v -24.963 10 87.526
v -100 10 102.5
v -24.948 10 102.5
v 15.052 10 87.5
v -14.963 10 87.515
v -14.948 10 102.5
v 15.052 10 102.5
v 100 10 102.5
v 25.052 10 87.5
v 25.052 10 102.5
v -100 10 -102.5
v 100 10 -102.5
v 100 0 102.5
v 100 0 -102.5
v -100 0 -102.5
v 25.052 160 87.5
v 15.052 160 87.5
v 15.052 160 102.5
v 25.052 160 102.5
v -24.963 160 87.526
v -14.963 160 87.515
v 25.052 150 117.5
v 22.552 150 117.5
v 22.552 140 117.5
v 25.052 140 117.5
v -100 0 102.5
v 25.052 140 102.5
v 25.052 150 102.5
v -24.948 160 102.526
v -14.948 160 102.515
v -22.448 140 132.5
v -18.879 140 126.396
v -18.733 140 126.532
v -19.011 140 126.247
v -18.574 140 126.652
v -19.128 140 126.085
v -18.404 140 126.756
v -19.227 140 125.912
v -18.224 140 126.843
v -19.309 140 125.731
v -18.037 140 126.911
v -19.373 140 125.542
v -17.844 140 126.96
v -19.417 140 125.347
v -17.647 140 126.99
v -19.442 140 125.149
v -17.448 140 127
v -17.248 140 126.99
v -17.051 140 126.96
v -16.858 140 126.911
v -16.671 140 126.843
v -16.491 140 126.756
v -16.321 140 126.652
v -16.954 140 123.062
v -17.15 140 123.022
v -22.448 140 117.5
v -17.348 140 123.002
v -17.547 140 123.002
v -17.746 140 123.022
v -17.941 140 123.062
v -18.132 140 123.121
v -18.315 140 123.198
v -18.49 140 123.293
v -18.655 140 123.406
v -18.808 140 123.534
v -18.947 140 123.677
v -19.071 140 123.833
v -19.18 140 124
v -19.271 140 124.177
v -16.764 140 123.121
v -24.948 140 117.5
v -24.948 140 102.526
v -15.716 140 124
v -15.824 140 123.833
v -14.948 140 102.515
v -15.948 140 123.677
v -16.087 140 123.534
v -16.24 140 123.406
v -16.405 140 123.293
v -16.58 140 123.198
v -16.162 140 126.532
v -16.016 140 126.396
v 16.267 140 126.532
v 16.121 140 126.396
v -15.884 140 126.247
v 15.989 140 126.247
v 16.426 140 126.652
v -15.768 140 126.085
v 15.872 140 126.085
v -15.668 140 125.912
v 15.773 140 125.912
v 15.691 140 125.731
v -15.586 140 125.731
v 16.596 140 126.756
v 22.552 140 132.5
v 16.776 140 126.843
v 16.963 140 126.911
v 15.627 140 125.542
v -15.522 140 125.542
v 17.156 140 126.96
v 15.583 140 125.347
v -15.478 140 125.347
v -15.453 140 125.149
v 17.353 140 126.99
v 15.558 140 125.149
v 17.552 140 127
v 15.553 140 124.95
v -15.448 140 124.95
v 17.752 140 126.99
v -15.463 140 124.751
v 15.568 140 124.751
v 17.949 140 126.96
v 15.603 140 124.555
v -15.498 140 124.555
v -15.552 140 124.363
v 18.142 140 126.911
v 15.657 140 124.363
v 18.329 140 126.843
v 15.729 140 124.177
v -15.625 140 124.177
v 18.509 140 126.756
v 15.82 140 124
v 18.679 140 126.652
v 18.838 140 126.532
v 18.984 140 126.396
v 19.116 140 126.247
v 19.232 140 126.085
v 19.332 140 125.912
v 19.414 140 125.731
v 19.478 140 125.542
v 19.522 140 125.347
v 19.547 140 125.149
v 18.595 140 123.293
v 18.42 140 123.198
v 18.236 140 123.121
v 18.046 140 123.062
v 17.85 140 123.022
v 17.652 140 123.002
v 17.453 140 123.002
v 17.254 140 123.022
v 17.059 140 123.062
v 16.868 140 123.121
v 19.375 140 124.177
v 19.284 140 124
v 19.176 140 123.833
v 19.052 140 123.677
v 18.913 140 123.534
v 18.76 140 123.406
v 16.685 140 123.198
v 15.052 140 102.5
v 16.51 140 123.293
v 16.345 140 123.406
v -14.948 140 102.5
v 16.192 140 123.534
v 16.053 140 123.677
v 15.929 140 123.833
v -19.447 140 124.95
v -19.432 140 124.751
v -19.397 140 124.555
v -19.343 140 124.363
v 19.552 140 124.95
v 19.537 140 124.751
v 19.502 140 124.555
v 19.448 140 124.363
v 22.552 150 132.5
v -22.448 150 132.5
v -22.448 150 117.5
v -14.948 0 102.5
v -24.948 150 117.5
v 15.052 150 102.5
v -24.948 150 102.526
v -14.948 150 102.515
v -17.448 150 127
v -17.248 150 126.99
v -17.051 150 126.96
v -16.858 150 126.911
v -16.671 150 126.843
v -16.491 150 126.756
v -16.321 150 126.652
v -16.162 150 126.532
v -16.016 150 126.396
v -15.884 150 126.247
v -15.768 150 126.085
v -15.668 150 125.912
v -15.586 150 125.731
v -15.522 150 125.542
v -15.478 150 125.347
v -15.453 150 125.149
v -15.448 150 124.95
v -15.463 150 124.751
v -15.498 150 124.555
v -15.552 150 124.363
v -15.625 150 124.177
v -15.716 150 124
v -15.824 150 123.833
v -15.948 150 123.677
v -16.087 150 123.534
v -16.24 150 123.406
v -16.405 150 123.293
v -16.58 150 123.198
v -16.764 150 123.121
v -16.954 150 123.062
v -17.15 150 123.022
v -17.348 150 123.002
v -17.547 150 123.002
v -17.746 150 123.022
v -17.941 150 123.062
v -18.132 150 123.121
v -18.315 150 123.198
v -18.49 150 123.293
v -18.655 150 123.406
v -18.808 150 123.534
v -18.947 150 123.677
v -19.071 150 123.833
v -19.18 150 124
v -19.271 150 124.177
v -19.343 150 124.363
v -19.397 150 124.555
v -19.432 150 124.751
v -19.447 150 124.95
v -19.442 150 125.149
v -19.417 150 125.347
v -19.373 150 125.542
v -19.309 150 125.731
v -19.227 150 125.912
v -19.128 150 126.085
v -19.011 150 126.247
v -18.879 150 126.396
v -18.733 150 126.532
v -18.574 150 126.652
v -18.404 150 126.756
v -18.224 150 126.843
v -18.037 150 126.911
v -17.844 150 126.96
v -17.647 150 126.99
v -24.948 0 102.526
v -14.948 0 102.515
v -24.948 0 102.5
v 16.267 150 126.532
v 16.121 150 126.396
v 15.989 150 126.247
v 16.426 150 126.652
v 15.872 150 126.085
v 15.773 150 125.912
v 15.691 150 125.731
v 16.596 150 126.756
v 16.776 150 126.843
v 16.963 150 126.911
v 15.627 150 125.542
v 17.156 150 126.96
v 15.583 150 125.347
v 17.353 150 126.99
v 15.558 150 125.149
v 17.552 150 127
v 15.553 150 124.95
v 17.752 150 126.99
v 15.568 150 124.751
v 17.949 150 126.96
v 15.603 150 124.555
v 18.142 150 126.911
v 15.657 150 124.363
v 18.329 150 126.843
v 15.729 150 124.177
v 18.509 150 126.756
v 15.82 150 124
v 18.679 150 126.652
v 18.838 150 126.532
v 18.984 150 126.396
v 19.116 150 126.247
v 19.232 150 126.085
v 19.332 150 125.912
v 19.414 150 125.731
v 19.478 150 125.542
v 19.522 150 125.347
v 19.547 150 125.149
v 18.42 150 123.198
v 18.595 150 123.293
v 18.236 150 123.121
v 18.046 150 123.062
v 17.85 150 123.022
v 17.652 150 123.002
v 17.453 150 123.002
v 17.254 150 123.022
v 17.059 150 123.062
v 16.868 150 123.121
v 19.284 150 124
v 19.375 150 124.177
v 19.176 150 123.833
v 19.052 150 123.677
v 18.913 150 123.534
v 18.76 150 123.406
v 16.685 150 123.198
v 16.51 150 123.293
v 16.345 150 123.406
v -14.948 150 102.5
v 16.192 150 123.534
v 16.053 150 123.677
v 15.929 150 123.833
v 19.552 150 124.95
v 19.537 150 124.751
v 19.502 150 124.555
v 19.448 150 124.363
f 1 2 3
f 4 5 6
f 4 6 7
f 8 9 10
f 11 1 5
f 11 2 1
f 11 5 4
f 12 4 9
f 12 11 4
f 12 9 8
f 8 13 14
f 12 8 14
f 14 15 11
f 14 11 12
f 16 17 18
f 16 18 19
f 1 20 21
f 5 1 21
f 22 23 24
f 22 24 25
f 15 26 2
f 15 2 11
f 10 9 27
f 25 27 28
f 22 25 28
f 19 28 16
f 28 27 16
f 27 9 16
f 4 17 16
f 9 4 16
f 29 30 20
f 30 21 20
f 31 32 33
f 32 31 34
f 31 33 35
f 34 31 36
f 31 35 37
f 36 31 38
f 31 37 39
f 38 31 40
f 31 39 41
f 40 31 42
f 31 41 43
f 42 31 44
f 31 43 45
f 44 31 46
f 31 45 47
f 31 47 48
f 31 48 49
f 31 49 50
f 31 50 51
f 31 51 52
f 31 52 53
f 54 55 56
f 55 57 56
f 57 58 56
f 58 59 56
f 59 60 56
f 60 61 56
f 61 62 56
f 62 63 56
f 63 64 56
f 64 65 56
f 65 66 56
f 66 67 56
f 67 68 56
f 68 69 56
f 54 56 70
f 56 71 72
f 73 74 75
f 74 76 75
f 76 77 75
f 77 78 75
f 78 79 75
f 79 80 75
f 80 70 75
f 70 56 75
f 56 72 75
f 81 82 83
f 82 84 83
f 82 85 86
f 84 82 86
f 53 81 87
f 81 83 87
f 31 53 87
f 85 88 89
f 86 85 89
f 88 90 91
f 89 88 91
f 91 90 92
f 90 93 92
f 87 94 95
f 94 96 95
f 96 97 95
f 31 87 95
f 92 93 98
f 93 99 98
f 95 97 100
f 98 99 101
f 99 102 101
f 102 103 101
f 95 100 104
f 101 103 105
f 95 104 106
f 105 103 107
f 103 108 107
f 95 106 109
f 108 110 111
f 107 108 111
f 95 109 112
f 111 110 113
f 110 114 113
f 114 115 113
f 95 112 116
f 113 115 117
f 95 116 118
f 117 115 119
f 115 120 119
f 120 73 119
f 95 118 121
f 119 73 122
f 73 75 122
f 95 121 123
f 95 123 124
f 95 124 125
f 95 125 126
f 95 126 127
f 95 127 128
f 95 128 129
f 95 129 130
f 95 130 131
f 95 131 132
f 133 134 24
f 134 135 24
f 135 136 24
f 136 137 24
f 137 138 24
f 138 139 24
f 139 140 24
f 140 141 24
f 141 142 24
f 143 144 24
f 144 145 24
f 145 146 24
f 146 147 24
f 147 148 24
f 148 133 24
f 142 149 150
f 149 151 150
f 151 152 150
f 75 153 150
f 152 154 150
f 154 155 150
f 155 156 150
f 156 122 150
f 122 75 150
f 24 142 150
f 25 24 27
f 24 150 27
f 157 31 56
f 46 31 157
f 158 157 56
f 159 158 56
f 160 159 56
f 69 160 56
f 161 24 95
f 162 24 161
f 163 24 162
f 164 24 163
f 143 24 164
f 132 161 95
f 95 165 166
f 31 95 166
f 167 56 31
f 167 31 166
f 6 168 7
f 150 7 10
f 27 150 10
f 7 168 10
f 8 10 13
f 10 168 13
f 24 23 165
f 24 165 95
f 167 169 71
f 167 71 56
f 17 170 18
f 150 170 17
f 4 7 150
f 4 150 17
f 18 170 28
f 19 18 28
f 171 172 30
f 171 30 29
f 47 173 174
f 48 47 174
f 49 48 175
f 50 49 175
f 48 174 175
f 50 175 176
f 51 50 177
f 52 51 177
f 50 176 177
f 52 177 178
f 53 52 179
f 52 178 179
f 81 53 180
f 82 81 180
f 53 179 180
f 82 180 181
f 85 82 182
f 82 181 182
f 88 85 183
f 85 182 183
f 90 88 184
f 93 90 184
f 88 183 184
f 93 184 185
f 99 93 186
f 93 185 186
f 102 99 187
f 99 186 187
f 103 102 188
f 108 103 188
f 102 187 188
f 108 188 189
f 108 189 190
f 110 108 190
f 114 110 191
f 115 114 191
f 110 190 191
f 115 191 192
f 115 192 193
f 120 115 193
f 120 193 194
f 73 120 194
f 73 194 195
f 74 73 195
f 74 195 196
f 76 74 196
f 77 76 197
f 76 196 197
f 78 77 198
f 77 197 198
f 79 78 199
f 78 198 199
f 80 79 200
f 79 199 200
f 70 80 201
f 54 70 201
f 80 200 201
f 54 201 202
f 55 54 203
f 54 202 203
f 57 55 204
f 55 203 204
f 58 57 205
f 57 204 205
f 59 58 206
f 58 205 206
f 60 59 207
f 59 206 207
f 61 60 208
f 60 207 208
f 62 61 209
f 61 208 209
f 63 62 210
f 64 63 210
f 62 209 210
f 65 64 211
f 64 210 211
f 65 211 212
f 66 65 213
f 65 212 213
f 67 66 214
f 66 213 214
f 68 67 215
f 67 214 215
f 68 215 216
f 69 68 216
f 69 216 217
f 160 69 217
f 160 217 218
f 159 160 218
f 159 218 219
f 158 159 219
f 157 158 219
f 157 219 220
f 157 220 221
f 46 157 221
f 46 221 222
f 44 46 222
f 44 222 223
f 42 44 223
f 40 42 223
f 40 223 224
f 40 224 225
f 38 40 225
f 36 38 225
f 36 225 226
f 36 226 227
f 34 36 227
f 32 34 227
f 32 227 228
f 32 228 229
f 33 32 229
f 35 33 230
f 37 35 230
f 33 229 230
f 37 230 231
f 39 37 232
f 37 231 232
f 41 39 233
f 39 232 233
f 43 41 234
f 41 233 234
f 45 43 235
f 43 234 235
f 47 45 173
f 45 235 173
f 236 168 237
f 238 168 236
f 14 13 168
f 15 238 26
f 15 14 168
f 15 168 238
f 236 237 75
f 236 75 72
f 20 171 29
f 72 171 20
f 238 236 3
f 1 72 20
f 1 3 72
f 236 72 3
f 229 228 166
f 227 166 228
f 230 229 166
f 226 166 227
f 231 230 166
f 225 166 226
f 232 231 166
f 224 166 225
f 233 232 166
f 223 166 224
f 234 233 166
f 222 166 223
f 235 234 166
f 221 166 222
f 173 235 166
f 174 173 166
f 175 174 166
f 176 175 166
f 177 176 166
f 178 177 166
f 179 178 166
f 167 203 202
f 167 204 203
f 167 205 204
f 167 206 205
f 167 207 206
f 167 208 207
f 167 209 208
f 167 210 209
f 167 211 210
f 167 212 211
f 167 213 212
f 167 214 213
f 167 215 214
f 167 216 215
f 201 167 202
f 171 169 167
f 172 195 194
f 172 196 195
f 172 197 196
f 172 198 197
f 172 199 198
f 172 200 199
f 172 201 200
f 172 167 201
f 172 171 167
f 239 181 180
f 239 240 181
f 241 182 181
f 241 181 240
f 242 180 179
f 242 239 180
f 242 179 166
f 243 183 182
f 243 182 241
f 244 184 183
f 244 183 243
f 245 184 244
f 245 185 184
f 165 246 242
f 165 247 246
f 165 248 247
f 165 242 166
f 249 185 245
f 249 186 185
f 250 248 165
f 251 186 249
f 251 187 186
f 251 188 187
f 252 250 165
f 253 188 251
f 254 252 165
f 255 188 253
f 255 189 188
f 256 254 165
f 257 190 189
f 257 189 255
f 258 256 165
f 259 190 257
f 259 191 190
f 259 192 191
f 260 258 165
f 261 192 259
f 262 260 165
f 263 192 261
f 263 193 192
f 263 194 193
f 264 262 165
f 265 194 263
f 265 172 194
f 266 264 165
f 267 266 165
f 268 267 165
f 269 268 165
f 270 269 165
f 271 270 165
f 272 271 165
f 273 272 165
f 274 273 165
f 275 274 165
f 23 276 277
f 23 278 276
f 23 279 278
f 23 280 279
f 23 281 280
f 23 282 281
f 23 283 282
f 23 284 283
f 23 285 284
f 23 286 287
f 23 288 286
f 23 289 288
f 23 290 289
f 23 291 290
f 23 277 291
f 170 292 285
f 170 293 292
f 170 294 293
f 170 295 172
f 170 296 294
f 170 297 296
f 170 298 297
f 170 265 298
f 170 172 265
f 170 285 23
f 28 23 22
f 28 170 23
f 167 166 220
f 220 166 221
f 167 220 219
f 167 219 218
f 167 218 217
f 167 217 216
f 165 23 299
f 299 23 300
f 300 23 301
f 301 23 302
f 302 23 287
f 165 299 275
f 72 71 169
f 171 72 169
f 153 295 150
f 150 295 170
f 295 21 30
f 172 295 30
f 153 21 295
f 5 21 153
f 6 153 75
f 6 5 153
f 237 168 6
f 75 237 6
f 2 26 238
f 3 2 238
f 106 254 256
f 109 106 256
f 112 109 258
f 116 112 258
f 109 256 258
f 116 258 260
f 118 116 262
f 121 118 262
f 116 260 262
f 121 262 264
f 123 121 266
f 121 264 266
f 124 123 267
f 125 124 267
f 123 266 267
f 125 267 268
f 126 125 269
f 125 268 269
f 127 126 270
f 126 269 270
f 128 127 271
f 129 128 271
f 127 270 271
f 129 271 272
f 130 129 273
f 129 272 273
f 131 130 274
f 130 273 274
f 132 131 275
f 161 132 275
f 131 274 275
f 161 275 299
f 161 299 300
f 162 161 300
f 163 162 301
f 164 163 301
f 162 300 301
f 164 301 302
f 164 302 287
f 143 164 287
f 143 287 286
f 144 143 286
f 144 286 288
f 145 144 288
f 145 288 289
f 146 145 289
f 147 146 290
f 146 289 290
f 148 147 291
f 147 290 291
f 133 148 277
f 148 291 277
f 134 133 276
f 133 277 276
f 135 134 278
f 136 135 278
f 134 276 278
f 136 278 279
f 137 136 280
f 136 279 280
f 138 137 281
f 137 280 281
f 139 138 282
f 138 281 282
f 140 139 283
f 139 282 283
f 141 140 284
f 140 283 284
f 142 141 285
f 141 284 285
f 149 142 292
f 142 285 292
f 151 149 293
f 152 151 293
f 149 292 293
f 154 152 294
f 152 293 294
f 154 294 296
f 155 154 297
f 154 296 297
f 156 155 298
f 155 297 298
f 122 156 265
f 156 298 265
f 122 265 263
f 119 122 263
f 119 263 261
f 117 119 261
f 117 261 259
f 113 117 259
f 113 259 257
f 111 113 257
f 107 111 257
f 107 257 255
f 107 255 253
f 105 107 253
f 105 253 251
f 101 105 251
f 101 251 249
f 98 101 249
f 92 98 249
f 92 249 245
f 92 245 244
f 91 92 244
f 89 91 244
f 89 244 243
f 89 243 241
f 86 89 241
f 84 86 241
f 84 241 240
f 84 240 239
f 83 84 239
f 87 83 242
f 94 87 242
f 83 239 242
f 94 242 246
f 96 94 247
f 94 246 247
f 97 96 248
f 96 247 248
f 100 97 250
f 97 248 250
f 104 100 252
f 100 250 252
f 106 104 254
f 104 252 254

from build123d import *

# Parameters (mm, degrees)
SKETCH2_W           = 200
SKETCH2_H           = 205
BOSS_EXTRUDE1_DEPTH = 10
SKETCH3_W           = 10
SKETCH3_H           = 15
BOSS_EXTRUDE3_DEPTH = 160
SKETCH8_W           = 49.999986941
SKETCH8_H           = 10
BOSS_EXTRUDE4_DEPTH = 15
BOSS_EXTRUDE5_DEPTH = 15
SKETCH10_R          = 2
CUT_EXTRUDE1_DEPTH  = 10


with BuildPart() as part:
    # Sketch2 → Boss-Extrude1 (new body)
    with BuildSketch(Plane(origin=(0, 0, 0), x_dir=(1, 0, 0), z_dir=(0, 1, 0))):
        Rectangle(SKETCH2_W, SKETCH2_H)
    extrude(amount=BOSS_EXTRUDE1_DEPTH)

    # Sketch3 → Boss-Extrude3 (add)
    with BuildSketch(Plane(origin=(0, 0, 0), x_dir=(1, 0, 0), z_dir=(0, 1, 0))):
        Polygon((-14.947609587, -102.515331482), (-24.947604363, -102.525552471), (-24.962935845, -87.525560306), (-14.962941069, -87.515339317), align=None)
        with Locations((20.052382578, -95)):
            Rectangle(SKETCH3_W, SKETCH3_H)
    extrude(amount=BOSS_EXTRUDE3_DEPTH)

    # Sketch8 → Boss-Extrude4 (add)
    with BuildSketch(Plane.XY.offset(102.5)):
        with Locations((0.052389108, 145)):
            Rectangle(SKETCH8_W, SKETCH8_H)
    extrude(amount=BOSS_EXTRUDE4_DEPTH)

    # Sketch9 → Boss-Extrude5 (add)
    with BuildSketch(Plane.XY.offset(117.5)):
        Polygon((0.052389108, 150), (22.552389108, 150), (22.552389108, 140), (-22.447610892, 140), (-22.447610892, 150), align=None)
    extrude(amount=BOSS_EXTRUDE5_DEPTH)

    # Sketch10 → Cut-Extrude1 (cut)
    with BuildSketch(Plane(origin=(0, 150, 0), x_dir=(1, 0, 0), z_dir=(0, 1, 0))):
        with Locations(Location((17.552389108, -125, 0), (0, 0, 270))):
            Circle(SKETCH10_R)
        with Locations(Location((-17.447610892, -125, 0), (0, 0, 270))):
            Circle(SKETCH10_R)
    extrude(amount=-CUT_EXTRUDE1_DEPTH, mode=Mode.SUBTRACT)


solid = part.part
